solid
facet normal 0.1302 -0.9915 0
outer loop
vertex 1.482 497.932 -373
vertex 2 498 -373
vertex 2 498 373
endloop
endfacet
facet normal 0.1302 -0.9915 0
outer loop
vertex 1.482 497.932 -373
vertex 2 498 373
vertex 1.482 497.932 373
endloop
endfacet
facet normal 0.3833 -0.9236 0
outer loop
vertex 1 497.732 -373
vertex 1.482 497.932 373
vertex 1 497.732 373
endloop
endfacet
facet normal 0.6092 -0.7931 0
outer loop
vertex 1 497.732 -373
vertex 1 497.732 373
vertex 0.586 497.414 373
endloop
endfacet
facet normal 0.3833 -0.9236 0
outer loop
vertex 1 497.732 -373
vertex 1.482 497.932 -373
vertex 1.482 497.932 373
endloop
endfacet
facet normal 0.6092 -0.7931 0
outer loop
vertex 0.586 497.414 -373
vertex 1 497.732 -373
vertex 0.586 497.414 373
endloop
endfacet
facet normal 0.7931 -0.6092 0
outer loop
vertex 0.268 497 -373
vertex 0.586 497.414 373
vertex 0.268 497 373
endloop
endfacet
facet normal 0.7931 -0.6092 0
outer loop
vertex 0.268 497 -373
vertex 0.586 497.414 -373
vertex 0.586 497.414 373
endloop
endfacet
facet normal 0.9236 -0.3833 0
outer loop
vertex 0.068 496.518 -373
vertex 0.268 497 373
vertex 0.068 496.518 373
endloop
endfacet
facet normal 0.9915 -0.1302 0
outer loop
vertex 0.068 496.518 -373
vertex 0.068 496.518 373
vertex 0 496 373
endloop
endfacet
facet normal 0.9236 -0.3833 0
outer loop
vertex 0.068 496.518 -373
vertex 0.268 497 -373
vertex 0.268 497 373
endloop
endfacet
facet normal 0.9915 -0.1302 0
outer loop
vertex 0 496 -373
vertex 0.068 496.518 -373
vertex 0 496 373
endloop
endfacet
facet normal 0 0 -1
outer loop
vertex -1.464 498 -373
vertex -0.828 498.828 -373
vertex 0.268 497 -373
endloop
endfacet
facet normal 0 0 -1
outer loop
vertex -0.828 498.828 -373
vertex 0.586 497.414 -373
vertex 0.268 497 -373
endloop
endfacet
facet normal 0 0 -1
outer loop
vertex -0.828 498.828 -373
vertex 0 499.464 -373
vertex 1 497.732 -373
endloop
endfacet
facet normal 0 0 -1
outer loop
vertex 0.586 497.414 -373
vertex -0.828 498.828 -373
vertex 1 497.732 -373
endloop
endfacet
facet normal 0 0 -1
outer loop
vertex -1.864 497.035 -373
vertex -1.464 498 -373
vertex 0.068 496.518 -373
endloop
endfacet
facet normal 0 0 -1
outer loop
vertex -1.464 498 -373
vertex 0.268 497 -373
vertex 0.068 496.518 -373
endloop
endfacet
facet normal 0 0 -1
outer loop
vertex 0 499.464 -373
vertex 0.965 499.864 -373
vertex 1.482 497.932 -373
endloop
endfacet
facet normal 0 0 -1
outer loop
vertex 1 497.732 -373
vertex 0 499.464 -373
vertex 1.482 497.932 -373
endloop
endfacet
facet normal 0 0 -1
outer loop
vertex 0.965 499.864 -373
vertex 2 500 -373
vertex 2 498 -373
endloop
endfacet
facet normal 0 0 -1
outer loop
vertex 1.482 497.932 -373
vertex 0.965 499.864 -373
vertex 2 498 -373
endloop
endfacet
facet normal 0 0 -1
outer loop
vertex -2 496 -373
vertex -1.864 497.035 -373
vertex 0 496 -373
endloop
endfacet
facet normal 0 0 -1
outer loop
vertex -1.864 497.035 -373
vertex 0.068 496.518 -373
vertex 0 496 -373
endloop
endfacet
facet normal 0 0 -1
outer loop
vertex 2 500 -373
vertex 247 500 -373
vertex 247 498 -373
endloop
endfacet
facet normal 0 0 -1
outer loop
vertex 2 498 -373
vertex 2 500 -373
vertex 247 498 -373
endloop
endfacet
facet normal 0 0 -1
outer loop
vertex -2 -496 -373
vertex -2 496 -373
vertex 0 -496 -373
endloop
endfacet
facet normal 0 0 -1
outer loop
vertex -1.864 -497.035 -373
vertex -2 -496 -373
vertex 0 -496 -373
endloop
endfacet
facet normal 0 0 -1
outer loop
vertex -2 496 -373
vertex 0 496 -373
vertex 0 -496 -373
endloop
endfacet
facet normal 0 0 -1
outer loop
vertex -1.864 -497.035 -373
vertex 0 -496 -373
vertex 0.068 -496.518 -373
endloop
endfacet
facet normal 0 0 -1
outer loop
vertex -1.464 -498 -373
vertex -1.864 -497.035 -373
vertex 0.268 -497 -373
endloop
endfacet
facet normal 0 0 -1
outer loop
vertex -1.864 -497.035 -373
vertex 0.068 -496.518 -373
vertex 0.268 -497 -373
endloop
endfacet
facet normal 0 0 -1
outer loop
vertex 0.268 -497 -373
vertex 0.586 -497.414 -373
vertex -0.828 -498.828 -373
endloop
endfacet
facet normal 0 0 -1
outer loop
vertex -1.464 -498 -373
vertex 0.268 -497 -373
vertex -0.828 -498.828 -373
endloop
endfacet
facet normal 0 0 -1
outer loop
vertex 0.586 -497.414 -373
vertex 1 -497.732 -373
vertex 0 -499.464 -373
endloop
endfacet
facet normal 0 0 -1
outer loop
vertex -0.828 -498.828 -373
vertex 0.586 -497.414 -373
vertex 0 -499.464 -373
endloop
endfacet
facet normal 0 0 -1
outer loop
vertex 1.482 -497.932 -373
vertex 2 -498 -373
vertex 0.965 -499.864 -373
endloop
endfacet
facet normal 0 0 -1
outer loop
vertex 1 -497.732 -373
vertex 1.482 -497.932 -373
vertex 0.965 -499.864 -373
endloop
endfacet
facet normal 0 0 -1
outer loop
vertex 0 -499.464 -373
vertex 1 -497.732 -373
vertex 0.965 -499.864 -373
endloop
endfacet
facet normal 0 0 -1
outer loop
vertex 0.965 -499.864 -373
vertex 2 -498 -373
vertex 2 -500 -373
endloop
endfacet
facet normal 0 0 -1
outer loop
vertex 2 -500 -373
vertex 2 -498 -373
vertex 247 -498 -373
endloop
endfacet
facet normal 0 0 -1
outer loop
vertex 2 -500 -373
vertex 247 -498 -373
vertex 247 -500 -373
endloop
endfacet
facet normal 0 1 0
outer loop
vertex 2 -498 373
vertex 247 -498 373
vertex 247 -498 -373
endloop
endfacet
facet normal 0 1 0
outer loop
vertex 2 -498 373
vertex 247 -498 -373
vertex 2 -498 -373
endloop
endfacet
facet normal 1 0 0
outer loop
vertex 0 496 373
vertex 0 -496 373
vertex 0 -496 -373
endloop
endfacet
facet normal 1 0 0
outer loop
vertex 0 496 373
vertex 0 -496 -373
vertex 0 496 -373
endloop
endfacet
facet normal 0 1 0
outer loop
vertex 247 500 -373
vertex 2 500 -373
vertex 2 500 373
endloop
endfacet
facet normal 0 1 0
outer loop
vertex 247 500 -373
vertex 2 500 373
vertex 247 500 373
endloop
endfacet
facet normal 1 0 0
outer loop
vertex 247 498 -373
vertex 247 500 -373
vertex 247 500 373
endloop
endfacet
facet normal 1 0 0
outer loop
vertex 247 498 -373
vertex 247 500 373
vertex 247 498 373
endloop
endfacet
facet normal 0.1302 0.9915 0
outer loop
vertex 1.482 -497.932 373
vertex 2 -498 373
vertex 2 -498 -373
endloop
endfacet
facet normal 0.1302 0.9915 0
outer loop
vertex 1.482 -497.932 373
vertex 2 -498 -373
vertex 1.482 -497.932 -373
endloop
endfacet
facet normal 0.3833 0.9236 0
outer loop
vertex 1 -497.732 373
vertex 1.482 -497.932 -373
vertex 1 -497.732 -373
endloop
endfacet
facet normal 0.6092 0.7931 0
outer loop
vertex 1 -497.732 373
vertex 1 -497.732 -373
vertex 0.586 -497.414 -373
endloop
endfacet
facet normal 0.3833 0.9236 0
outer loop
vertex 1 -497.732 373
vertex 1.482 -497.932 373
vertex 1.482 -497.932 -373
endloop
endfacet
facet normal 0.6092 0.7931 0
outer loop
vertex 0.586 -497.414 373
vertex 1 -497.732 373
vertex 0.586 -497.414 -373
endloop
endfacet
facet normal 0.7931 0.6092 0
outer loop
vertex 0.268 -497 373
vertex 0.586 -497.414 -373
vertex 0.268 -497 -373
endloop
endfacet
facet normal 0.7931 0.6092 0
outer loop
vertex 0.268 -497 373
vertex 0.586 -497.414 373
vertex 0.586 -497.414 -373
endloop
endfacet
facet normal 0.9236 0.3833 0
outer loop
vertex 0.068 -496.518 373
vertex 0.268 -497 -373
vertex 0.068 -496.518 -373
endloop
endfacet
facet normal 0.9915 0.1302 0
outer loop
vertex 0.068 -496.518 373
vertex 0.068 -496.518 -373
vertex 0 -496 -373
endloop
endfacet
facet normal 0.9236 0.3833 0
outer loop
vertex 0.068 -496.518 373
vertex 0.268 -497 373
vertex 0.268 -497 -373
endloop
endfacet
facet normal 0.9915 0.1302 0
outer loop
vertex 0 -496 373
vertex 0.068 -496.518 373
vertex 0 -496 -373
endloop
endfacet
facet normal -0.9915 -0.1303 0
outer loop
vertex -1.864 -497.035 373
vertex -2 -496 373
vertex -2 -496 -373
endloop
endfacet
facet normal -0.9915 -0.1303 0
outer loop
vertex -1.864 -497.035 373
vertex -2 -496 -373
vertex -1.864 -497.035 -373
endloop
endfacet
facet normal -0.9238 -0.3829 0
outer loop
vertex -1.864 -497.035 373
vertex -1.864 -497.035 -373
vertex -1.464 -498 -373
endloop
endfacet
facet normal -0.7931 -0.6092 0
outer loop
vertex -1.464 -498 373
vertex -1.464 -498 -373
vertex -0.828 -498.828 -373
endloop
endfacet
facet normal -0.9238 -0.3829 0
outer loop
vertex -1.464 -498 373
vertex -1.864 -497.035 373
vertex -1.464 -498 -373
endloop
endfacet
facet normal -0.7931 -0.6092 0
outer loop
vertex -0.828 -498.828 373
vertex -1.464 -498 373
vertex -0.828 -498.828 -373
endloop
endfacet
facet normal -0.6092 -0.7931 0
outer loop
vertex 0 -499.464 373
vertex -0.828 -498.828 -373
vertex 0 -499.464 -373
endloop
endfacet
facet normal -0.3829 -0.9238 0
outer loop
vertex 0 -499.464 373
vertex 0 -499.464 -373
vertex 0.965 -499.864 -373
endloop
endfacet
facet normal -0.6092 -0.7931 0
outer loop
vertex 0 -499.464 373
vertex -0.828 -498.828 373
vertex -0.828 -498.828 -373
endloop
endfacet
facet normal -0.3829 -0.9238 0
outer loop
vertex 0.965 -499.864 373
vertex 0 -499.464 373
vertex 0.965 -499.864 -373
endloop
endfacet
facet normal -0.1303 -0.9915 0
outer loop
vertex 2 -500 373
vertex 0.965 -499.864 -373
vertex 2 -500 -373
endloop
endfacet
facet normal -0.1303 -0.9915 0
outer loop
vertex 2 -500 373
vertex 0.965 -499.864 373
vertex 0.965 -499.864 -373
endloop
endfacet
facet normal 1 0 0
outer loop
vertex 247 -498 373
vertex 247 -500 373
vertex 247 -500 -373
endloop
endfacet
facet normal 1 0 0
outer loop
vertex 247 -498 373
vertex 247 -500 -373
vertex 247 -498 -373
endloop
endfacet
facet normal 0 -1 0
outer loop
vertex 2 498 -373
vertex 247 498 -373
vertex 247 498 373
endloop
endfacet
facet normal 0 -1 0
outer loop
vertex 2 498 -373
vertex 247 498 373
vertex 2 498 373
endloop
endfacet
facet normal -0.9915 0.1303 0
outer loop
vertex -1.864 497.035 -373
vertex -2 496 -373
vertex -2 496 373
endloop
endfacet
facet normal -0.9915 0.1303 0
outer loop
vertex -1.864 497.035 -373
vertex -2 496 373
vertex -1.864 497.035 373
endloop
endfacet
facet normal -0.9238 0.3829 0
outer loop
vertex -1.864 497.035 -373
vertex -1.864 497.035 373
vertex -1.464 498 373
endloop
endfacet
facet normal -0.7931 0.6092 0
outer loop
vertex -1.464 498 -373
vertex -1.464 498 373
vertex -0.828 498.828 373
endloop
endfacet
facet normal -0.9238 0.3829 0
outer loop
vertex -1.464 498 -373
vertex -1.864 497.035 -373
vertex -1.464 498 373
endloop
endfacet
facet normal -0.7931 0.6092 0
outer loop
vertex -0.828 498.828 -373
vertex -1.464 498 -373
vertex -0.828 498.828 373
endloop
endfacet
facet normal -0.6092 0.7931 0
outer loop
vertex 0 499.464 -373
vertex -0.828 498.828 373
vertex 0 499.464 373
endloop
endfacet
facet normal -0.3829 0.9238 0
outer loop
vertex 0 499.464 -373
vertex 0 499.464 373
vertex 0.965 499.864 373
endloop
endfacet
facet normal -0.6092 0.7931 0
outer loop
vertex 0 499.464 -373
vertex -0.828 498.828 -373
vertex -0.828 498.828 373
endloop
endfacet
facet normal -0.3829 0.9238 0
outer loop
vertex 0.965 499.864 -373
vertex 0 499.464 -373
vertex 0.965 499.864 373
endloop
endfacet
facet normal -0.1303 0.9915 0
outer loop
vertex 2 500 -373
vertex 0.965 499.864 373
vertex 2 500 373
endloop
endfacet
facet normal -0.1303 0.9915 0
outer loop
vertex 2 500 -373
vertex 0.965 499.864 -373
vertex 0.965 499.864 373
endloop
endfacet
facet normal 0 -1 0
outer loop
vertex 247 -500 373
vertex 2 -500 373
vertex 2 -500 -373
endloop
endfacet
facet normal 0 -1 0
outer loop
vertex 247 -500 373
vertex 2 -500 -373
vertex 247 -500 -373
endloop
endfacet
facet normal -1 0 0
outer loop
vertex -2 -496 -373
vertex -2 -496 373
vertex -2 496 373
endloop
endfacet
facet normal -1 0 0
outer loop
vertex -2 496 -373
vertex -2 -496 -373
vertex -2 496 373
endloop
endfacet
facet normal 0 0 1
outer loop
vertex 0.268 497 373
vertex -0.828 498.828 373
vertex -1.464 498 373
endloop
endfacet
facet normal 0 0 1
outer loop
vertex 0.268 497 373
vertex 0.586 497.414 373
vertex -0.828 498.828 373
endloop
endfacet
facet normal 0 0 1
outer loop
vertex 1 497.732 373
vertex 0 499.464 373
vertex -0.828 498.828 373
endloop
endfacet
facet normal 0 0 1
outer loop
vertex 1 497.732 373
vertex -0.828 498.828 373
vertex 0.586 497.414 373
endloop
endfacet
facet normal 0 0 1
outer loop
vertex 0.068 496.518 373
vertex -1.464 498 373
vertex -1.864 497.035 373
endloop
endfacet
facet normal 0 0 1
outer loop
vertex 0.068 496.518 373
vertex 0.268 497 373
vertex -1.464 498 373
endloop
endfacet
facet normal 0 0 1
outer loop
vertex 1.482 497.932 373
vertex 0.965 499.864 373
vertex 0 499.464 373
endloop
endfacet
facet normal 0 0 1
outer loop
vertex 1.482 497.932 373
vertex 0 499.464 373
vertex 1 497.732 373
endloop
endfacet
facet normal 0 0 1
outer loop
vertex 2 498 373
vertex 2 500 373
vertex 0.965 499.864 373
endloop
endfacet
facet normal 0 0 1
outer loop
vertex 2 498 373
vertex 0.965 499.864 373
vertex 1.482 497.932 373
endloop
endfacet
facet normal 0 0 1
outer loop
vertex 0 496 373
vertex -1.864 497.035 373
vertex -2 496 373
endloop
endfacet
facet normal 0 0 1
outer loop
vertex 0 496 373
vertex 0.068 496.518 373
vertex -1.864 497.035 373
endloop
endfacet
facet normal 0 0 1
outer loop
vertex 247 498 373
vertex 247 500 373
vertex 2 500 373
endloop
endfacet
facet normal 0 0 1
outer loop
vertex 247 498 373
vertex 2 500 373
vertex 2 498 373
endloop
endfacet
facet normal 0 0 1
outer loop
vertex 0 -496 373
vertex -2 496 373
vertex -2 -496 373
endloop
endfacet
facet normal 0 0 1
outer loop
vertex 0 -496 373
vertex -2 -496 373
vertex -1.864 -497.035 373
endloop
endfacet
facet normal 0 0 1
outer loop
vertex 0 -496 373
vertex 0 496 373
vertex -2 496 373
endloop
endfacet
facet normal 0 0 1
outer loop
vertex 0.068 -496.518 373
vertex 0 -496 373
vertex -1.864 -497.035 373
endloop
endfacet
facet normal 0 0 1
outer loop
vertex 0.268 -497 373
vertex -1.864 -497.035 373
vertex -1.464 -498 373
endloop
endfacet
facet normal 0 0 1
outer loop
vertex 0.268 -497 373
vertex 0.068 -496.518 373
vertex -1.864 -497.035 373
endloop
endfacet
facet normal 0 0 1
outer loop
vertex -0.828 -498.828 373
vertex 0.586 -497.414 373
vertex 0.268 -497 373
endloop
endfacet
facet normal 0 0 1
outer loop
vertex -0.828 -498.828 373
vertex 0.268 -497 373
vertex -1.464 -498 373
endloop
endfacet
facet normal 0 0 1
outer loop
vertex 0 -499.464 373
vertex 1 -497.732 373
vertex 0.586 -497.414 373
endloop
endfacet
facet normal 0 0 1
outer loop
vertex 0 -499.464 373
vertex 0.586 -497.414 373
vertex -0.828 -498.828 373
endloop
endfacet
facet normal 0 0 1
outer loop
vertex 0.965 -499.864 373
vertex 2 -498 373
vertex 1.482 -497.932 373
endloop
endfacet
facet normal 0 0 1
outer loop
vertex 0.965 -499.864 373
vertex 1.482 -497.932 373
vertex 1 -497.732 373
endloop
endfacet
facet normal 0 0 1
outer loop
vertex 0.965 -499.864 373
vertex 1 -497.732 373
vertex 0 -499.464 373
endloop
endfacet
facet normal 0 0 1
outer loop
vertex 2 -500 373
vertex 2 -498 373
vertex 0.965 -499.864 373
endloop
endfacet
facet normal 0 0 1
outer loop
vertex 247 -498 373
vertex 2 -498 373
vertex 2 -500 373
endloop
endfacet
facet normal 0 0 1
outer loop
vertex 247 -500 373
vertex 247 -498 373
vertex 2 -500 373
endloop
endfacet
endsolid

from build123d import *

# Parameters (mm, degrees)
SKETCH1_W               = 992
SKETCH1_H               = 746
BASE_FLANGE1_DEPTH      = 2
EDGE_FLANGE1_DEPTH      = 746
EDGE_FLANGE1_BEND_DEPTH = 746


# Sheet-metal steps are written as plain solids
with BuildPart() as part:
    # Sketch1 → Base-Flange1 (new body)
    with BuildSketch(Plane.YZ):
        Rectangle(SKETCH1_W, SKETCH1_H)
    extrude(amount=-BASE_FLANGE1_DEPTH)

    # Edge-Flange1 section (across the edge) → Edge-Flange1 (add)
    with BuildSketch(Plane(origin=(0, 498, -373), x_dir=(0, -1, 0), z_dir=(0, 0, 1))):
        with BuildLine():
            Line((-2, 2), (-2, 247))
            Line((-2, 247), (0, 247))
            Line((0, 247), (0, 2))
            ThreePointArc((0, 2), (0.585786438, 0.585786438), (2, 0))
            Line((2, 0), (2, -2))
            ThreePointArc((2, -2), (-0.828427125, -0.828427125), (-2, 2))
        make_face()
    extrude(amount=EDGE_FLANGE1_DEPTH)

    # Edge-Flange1 section 2 (across the edge) → Edge-Flange1 bend (add)
    with BuildSketch(Plane(origin=(0, -498, 373), x_dir=(0, 1, 0), z_dir=(0, 0, -1))):
        with BuildLine():
            Line((-2, 2), (-2, 247))
            Line((-2, 247), (0, 247))
            Line((0, 247), (0, 2))
            ThreePointArc((0, 2), (0.585786438, 0.585786438), (2, 0))
            Line((2, 0), (2, -2))
            ThreePointArc((2, -2), (-0.828427125, -0.828427125), (-2, 2))
        make_face()
    extrude(amount=EDGE_FLANGE1_BEND_DEPTH)


solid = part.part
